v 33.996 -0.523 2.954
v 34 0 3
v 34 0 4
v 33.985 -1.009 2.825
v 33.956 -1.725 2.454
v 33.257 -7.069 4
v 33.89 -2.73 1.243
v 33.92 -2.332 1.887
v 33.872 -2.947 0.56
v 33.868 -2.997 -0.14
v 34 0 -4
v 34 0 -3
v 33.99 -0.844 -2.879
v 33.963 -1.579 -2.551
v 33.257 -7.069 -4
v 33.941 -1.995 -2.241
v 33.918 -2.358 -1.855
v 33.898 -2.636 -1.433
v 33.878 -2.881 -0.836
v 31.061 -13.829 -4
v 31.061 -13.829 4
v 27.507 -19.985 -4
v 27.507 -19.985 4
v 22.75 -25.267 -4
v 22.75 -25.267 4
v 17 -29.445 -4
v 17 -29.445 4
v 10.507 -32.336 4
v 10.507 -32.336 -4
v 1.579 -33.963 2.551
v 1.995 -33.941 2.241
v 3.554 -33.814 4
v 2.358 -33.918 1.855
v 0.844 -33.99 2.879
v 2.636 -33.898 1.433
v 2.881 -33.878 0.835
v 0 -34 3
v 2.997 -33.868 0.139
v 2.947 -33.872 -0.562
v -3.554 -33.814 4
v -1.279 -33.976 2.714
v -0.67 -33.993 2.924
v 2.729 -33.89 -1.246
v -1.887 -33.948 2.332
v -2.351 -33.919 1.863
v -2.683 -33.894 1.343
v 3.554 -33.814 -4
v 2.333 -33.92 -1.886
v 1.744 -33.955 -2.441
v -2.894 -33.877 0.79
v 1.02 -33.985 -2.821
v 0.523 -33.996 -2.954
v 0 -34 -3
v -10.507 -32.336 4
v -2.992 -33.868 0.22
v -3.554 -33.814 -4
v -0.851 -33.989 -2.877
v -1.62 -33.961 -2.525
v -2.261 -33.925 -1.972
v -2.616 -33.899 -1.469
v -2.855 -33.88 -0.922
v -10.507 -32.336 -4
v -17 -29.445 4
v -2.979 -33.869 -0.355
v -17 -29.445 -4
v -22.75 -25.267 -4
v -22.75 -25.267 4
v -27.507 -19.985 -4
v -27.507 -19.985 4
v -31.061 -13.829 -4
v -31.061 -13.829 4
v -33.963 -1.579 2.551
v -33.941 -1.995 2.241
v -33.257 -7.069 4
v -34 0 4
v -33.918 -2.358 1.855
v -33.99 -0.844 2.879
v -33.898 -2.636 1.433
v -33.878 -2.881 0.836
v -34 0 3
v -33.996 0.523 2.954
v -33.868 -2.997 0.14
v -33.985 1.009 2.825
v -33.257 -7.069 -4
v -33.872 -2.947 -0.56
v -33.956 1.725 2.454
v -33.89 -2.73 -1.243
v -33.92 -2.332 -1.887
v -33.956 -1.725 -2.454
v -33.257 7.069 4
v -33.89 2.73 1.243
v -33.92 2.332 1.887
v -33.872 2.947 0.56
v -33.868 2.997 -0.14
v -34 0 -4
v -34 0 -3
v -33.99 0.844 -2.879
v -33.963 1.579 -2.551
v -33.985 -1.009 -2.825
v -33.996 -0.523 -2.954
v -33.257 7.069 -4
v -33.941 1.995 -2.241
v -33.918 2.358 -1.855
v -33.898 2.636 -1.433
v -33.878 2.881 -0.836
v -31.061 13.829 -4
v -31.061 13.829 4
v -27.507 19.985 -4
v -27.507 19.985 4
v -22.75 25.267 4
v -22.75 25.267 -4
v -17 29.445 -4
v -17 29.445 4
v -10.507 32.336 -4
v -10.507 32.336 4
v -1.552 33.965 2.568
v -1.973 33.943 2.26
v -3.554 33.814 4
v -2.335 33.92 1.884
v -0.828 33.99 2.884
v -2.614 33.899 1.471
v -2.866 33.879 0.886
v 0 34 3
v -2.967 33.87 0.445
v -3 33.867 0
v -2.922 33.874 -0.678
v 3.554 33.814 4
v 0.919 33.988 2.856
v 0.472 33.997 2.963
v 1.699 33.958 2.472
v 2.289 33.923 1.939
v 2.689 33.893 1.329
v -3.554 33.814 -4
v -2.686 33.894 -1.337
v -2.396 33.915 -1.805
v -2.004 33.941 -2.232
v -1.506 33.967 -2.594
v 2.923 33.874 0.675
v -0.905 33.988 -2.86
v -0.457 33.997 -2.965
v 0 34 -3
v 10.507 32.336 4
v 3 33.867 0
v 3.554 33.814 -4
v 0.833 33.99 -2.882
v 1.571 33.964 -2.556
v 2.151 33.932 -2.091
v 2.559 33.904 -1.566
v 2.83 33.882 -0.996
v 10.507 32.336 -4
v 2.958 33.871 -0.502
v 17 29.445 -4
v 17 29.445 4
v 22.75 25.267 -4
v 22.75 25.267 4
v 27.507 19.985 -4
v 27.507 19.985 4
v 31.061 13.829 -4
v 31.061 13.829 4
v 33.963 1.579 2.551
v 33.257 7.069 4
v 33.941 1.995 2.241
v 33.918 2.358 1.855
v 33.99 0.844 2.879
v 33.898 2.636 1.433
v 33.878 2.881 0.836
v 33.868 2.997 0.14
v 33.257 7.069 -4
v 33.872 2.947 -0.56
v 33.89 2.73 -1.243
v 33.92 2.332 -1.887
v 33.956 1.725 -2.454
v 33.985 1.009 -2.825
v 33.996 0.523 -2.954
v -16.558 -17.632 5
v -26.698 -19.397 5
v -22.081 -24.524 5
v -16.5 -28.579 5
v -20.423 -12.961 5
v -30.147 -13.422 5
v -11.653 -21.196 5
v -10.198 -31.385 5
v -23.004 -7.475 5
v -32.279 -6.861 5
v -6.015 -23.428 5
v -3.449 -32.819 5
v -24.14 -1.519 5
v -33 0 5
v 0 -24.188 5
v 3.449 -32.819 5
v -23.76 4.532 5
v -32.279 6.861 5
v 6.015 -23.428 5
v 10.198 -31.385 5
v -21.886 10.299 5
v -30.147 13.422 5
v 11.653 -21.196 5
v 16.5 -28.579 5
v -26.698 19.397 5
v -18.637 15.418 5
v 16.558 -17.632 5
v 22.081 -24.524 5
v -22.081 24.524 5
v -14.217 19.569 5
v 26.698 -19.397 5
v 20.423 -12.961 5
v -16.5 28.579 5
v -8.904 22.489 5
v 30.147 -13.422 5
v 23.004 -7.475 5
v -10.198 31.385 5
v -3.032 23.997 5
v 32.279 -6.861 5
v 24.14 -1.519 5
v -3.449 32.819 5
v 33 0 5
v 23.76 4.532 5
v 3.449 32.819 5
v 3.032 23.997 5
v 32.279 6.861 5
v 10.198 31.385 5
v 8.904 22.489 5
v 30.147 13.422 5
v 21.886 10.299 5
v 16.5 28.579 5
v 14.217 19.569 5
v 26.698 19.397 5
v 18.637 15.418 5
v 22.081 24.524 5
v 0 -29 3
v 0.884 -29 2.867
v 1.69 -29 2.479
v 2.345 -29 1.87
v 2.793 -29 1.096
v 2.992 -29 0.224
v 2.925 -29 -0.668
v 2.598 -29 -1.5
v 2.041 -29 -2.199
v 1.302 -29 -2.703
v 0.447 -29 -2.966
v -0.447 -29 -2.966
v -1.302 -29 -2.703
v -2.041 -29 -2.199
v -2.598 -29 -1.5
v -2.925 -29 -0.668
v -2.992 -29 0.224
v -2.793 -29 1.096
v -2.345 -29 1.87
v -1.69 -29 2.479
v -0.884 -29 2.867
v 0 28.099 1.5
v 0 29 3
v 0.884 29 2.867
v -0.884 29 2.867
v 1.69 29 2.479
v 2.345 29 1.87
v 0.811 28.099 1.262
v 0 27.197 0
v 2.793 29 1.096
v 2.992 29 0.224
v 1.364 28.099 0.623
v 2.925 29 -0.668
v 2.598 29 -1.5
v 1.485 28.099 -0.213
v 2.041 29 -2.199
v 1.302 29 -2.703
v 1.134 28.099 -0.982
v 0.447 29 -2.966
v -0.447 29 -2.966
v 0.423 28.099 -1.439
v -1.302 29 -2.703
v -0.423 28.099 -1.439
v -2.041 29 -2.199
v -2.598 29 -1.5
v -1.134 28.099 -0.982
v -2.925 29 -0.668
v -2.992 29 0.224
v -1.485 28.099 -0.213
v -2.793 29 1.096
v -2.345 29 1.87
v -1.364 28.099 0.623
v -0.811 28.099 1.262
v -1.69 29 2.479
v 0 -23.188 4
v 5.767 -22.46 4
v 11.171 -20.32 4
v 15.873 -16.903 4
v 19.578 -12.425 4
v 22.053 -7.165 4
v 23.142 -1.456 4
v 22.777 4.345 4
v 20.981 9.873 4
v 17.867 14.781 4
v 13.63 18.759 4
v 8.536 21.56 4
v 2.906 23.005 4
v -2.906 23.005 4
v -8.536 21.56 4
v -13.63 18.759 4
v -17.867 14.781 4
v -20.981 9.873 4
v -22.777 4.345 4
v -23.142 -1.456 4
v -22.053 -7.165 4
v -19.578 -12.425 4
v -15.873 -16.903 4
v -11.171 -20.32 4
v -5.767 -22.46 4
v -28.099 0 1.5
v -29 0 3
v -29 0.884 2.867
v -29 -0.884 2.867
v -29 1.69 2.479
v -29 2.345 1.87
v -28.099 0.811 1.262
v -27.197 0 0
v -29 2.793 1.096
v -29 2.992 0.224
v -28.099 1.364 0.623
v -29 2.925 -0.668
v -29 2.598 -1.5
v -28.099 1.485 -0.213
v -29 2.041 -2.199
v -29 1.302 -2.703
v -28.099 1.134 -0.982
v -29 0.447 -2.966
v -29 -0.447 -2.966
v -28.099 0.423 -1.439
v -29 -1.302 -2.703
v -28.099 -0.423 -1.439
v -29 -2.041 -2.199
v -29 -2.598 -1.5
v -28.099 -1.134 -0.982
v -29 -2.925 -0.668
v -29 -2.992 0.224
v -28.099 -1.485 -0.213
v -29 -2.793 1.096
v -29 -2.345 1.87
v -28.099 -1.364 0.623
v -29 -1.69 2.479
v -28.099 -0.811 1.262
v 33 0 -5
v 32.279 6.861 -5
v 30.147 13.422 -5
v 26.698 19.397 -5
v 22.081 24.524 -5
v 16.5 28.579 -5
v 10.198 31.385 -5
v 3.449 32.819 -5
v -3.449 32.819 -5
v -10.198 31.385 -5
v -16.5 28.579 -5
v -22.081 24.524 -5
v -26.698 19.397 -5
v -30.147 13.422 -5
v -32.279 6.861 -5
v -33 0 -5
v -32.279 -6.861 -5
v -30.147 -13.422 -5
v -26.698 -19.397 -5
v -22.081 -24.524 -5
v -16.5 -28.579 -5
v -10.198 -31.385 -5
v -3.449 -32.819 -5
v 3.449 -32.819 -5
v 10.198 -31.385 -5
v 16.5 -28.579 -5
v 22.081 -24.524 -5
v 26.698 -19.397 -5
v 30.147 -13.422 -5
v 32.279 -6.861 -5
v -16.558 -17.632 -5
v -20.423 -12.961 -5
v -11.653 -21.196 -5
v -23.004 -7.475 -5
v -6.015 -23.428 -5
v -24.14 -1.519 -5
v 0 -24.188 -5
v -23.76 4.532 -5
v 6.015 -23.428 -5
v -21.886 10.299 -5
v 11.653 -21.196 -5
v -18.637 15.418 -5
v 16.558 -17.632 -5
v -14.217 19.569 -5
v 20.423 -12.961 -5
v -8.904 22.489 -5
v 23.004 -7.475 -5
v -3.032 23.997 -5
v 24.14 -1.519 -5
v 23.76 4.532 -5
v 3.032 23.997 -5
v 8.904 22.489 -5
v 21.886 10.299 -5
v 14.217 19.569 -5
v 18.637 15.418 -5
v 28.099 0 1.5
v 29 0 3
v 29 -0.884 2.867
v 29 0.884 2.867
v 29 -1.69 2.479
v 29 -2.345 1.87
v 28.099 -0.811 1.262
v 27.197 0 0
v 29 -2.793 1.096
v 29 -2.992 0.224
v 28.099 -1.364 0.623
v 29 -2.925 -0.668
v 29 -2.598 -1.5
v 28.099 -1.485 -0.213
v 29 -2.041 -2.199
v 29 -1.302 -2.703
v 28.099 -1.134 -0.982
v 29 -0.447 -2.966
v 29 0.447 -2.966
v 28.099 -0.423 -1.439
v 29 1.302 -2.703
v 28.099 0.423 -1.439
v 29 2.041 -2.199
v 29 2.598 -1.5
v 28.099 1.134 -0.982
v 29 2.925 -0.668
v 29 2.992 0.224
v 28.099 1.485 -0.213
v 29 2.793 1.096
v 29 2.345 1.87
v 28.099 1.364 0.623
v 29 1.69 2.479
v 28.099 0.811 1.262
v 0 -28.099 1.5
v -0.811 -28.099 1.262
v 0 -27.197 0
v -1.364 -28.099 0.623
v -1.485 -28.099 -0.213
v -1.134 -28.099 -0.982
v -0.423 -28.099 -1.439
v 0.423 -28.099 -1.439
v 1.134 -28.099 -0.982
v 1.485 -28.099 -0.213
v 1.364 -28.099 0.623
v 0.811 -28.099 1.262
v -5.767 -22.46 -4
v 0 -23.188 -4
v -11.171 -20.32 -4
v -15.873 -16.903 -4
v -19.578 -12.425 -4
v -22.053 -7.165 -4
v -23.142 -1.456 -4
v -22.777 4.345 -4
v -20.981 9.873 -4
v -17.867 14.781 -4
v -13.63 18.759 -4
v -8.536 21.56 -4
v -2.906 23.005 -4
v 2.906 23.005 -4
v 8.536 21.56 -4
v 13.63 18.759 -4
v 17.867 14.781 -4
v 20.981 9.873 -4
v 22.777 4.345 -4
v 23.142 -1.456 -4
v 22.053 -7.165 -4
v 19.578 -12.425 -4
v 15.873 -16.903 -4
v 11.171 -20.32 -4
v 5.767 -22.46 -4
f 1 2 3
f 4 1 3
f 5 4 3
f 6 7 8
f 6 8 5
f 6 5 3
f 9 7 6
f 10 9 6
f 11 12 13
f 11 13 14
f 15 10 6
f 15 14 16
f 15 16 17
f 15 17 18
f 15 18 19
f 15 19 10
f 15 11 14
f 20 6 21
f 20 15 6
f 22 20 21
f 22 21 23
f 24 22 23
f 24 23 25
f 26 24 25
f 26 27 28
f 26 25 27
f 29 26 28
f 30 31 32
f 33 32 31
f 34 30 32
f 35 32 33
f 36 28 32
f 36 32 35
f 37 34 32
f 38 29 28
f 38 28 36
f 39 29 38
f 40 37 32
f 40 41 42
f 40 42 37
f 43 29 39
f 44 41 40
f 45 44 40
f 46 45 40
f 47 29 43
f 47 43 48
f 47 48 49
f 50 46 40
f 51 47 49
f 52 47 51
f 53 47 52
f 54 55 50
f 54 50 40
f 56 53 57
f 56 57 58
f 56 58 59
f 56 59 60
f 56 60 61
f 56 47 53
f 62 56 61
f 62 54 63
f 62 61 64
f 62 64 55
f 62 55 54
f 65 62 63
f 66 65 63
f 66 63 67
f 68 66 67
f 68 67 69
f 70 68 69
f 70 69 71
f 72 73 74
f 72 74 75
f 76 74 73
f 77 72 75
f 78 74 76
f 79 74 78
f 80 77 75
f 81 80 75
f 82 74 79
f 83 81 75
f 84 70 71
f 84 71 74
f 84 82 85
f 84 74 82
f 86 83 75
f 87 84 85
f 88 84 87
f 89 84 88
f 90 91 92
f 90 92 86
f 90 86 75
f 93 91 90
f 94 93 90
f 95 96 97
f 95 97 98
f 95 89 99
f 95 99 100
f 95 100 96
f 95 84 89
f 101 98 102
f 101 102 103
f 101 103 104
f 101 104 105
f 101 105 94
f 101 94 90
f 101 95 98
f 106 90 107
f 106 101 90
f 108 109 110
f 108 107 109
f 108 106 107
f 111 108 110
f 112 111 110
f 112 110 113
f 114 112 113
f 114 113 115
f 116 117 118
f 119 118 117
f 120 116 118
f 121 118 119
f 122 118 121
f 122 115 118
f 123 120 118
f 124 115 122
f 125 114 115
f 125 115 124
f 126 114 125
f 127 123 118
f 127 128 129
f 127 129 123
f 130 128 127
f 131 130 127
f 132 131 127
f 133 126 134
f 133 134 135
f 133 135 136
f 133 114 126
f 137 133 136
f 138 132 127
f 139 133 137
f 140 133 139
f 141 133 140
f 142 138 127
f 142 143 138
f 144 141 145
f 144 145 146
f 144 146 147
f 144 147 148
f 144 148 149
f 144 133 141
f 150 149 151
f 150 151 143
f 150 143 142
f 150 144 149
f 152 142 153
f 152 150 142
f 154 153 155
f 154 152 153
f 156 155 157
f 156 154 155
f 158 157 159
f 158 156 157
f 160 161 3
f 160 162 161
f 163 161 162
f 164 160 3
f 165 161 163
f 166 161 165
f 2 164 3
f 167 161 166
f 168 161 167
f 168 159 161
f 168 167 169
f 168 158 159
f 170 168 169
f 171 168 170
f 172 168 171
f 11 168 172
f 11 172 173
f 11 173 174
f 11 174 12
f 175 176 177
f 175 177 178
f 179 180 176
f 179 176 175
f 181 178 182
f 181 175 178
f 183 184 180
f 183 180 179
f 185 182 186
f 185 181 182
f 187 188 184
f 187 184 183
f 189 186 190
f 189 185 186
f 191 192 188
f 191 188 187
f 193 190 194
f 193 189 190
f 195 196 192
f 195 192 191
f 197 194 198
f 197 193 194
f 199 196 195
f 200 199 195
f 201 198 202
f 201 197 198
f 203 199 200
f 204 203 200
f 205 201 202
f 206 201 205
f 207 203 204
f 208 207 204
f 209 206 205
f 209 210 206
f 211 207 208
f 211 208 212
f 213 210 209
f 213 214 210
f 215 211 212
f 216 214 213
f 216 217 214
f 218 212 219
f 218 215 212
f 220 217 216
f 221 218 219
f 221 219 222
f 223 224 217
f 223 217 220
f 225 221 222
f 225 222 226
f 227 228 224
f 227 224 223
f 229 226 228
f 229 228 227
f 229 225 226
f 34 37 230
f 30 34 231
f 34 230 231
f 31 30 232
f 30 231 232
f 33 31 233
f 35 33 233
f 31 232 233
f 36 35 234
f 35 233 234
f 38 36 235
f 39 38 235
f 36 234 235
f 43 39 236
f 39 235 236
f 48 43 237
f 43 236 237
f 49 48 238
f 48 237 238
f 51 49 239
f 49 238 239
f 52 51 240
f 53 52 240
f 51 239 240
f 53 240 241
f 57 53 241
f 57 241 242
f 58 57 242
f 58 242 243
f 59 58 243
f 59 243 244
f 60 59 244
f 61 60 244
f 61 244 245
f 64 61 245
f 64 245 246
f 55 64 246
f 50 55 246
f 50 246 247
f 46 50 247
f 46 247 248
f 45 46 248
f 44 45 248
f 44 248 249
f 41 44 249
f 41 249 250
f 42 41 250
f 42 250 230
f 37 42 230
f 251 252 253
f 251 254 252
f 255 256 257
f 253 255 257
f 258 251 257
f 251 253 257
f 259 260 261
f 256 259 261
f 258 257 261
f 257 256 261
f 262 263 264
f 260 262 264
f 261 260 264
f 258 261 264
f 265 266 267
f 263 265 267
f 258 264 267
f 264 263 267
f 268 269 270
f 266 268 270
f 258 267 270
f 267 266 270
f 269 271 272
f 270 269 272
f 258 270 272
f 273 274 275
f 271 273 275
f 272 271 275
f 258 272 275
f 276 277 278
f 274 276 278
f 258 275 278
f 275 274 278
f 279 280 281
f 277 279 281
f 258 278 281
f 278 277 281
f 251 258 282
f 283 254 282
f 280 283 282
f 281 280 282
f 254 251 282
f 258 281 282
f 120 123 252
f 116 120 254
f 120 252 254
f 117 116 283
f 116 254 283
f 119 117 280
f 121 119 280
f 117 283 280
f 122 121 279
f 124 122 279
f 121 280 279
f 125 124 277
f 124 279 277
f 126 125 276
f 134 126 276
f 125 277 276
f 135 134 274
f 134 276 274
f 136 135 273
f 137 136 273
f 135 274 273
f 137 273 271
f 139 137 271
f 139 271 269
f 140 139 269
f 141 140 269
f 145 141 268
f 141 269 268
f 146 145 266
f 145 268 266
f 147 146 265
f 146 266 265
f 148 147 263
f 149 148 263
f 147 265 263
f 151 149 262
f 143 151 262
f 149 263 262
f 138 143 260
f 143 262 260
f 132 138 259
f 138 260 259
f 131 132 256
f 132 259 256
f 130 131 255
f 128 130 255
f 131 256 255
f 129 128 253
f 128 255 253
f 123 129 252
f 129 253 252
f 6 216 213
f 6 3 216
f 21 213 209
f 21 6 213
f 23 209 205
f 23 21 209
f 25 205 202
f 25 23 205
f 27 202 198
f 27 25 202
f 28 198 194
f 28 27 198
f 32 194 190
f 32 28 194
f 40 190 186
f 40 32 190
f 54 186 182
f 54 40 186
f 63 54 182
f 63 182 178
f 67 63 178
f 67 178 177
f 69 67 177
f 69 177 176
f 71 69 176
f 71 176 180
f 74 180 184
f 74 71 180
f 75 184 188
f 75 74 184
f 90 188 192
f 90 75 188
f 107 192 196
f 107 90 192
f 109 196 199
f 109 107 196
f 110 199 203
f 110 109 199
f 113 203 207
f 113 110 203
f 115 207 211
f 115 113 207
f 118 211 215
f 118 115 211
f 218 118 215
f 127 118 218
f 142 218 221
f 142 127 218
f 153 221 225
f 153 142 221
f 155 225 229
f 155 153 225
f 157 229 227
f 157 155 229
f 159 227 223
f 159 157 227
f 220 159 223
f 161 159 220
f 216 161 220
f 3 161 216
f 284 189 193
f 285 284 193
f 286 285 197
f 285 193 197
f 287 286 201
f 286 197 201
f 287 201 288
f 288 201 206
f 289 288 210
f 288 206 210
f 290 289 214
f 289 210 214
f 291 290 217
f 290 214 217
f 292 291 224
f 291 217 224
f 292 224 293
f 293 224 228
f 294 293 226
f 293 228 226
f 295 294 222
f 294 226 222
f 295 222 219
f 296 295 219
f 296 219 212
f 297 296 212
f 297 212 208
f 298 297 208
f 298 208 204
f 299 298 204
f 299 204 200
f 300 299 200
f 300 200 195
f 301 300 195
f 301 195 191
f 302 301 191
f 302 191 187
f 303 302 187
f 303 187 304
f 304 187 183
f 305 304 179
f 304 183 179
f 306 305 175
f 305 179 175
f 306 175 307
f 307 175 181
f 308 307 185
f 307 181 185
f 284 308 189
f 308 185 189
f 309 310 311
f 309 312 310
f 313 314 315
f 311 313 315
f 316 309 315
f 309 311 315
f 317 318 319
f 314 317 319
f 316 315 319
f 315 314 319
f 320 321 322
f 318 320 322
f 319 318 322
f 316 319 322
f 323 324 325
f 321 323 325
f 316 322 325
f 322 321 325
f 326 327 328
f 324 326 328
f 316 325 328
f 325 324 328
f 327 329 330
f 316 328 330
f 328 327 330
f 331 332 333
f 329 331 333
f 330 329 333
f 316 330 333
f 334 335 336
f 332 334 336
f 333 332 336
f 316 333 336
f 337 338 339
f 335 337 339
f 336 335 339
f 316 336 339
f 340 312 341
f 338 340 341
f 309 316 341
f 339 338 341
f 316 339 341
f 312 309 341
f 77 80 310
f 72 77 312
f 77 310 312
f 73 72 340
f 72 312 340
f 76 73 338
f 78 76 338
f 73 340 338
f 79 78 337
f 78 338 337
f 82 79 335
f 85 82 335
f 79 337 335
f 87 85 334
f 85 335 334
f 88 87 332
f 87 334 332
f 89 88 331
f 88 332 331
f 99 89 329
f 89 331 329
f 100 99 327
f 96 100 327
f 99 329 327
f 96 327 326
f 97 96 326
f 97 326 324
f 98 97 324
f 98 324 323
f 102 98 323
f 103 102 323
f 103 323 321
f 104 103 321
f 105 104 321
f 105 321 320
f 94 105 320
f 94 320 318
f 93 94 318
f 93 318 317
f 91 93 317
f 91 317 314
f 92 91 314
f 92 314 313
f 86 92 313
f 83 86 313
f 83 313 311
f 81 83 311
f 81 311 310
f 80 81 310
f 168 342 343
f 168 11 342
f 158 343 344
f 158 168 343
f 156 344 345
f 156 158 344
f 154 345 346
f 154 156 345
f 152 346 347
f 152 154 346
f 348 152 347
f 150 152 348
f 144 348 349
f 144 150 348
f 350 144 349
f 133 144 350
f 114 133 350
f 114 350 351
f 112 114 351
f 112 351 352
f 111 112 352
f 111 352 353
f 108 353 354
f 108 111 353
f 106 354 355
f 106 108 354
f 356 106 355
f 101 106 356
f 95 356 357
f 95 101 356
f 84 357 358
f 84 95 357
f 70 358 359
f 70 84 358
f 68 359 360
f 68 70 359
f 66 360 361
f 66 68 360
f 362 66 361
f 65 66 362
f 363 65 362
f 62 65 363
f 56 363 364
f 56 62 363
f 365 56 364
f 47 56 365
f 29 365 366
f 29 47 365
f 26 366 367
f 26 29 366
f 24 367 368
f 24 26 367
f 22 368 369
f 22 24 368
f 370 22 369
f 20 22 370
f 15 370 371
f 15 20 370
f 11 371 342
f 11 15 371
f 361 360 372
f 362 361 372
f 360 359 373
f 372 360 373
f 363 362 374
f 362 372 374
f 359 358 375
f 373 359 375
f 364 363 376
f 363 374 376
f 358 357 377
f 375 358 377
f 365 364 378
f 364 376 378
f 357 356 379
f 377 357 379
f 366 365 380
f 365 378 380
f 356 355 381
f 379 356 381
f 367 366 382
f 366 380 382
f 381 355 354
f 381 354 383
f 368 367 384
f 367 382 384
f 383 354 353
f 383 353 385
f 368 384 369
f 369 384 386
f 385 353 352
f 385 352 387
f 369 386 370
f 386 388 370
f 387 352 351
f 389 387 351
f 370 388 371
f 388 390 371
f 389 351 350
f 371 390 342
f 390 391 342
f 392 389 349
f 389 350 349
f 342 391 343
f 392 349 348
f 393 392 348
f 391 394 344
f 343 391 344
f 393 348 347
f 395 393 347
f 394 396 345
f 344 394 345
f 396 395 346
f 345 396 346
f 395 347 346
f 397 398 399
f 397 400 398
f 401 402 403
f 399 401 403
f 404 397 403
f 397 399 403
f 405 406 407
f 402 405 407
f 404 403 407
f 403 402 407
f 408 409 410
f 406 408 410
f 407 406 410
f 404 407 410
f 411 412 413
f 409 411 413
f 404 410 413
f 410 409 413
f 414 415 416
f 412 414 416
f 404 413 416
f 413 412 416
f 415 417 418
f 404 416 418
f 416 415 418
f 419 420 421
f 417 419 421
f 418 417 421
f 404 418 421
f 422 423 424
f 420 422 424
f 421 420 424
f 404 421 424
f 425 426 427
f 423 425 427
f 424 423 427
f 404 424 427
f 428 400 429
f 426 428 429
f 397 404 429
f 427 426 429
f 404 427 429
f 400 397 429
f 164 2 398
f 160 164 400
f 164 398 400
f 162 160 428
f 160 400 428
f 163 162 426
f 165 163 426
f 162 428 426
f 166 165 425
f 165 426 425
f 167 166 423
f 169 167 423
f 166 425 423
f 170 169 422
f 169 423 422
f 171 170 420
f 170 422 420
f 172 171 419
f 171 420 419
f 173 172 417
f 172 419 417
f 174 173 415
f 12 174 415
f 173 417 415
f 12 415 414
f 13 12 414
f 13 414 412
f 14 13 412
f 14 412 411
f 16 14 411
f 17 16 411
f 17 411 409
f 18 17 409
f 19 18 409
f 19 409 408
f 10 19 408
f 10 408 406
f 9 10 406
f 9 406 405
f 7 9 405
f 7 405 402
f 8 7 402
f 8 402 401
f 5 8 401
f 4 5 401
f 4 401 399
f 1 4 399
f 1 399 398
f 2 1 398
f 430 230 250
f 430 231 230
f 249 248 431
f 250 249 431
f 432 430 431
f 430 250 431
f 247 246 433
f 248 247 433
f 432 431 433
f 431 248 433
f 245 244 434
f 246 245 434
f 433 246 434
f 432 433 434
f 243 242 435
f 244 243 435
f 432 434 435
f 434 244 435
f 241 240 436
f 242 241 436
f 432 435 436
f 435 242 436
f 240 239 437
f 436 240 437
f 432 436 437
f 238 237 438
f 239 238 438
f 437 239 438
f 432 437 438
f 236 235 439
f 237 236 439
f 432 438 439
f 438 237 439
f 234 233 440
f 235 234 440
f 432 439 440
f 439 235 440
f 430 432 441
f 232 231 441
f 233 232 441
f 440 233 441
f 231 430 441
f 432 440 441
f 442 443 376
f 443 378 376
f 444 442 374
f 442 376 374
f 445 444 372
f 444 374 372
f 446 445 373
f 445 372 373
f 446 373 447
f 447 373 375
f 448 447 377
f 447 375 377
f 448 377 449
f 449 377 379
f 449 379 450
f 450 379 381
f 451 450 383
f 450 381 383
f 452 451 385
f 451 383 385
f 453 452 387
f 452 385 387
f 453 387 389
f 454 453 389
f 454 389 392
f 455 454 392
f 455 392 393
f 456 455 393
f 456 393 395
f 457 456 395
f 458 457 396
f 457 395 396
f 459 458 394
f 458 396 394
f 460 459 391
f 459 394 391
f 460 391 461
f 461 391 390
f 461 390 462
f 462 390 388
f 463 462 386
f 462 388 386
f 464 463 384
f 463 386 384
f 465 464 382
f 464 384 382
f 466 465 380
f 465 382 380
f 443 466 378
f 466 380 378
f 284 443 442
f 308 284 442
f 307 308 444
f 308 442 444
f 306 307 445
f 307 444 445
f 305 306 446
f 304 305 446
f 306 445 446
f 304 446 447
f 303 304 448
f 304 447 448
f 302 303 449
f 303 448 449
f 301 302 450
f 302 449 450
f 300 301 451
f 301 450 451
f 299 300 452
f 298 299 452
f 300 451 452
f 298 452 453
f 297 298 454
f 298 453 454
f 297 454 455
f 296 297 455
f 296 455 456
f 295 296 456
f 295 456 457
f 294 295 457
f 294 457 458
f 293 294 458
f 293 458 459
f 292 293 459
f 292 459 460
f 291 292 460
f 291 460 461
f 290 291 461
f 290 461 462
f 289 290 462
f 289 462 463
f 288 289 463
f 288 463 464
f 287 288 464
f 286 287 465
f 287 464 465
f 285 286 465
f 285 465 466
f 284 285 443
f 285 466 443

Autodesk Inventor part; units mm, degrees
ref_plane "YZ Plane" through (0, 0, 0) normal (1, 0, 0) x (0, 1, 0)
ref_plane "XY Plane" through (0, 0, 0) normal (0, 0, 1) x (1, 0, 0)
sketch "Эскиз1" plane through (0, 0, 0) normal (0, 0, 1) x (1, 0, 0)
  circle A0 centre (0, 0) radius 34
  dimension "d0" = 68
extrude "Выдавливание1" add sketch "Эскиз1" along normal mid plane 10
sketch "Эскиз2" plane through (0, 0, 5) normal (0, 0, 1) x (1, 0, 0)
  point P0 (0, 0)
  point P1 (0, 0)
hole "Отверстие1" at (0, 0, 5) direction (0, 0, -1) diameter 46.376 end through all thread size "M48x1.5" class "6H" standard "ISO Metric profile"
ref_plane "РабПлоскость1" through (0, 34, 0) normal (0, 1, 0) x (-1, 0, 0)
sketch "Эскиз3" plane through (0, 34, 0) normal (0, 1, 0) x (-1, 0, 0)
  point P0 (0, 0)
hole "Отверстие2" at (0, 34, 0) direction (0, -1, 0) diameter 6 depth 5 tip angle 118
pattern_circular "Круговой массив1" count 4 over 360 about axis through (0, 0, 0) along (0, 0, 1) of "Отверстие2"
chamfer "Фаска1" distance 1 angle 45 4 edges at (0, 23.188, 5) (0, 23.188, -5) (-34, 0, 5) (-34, 0, -5)
properties part number "05.01.002" material "Сталь, углеродистая"
